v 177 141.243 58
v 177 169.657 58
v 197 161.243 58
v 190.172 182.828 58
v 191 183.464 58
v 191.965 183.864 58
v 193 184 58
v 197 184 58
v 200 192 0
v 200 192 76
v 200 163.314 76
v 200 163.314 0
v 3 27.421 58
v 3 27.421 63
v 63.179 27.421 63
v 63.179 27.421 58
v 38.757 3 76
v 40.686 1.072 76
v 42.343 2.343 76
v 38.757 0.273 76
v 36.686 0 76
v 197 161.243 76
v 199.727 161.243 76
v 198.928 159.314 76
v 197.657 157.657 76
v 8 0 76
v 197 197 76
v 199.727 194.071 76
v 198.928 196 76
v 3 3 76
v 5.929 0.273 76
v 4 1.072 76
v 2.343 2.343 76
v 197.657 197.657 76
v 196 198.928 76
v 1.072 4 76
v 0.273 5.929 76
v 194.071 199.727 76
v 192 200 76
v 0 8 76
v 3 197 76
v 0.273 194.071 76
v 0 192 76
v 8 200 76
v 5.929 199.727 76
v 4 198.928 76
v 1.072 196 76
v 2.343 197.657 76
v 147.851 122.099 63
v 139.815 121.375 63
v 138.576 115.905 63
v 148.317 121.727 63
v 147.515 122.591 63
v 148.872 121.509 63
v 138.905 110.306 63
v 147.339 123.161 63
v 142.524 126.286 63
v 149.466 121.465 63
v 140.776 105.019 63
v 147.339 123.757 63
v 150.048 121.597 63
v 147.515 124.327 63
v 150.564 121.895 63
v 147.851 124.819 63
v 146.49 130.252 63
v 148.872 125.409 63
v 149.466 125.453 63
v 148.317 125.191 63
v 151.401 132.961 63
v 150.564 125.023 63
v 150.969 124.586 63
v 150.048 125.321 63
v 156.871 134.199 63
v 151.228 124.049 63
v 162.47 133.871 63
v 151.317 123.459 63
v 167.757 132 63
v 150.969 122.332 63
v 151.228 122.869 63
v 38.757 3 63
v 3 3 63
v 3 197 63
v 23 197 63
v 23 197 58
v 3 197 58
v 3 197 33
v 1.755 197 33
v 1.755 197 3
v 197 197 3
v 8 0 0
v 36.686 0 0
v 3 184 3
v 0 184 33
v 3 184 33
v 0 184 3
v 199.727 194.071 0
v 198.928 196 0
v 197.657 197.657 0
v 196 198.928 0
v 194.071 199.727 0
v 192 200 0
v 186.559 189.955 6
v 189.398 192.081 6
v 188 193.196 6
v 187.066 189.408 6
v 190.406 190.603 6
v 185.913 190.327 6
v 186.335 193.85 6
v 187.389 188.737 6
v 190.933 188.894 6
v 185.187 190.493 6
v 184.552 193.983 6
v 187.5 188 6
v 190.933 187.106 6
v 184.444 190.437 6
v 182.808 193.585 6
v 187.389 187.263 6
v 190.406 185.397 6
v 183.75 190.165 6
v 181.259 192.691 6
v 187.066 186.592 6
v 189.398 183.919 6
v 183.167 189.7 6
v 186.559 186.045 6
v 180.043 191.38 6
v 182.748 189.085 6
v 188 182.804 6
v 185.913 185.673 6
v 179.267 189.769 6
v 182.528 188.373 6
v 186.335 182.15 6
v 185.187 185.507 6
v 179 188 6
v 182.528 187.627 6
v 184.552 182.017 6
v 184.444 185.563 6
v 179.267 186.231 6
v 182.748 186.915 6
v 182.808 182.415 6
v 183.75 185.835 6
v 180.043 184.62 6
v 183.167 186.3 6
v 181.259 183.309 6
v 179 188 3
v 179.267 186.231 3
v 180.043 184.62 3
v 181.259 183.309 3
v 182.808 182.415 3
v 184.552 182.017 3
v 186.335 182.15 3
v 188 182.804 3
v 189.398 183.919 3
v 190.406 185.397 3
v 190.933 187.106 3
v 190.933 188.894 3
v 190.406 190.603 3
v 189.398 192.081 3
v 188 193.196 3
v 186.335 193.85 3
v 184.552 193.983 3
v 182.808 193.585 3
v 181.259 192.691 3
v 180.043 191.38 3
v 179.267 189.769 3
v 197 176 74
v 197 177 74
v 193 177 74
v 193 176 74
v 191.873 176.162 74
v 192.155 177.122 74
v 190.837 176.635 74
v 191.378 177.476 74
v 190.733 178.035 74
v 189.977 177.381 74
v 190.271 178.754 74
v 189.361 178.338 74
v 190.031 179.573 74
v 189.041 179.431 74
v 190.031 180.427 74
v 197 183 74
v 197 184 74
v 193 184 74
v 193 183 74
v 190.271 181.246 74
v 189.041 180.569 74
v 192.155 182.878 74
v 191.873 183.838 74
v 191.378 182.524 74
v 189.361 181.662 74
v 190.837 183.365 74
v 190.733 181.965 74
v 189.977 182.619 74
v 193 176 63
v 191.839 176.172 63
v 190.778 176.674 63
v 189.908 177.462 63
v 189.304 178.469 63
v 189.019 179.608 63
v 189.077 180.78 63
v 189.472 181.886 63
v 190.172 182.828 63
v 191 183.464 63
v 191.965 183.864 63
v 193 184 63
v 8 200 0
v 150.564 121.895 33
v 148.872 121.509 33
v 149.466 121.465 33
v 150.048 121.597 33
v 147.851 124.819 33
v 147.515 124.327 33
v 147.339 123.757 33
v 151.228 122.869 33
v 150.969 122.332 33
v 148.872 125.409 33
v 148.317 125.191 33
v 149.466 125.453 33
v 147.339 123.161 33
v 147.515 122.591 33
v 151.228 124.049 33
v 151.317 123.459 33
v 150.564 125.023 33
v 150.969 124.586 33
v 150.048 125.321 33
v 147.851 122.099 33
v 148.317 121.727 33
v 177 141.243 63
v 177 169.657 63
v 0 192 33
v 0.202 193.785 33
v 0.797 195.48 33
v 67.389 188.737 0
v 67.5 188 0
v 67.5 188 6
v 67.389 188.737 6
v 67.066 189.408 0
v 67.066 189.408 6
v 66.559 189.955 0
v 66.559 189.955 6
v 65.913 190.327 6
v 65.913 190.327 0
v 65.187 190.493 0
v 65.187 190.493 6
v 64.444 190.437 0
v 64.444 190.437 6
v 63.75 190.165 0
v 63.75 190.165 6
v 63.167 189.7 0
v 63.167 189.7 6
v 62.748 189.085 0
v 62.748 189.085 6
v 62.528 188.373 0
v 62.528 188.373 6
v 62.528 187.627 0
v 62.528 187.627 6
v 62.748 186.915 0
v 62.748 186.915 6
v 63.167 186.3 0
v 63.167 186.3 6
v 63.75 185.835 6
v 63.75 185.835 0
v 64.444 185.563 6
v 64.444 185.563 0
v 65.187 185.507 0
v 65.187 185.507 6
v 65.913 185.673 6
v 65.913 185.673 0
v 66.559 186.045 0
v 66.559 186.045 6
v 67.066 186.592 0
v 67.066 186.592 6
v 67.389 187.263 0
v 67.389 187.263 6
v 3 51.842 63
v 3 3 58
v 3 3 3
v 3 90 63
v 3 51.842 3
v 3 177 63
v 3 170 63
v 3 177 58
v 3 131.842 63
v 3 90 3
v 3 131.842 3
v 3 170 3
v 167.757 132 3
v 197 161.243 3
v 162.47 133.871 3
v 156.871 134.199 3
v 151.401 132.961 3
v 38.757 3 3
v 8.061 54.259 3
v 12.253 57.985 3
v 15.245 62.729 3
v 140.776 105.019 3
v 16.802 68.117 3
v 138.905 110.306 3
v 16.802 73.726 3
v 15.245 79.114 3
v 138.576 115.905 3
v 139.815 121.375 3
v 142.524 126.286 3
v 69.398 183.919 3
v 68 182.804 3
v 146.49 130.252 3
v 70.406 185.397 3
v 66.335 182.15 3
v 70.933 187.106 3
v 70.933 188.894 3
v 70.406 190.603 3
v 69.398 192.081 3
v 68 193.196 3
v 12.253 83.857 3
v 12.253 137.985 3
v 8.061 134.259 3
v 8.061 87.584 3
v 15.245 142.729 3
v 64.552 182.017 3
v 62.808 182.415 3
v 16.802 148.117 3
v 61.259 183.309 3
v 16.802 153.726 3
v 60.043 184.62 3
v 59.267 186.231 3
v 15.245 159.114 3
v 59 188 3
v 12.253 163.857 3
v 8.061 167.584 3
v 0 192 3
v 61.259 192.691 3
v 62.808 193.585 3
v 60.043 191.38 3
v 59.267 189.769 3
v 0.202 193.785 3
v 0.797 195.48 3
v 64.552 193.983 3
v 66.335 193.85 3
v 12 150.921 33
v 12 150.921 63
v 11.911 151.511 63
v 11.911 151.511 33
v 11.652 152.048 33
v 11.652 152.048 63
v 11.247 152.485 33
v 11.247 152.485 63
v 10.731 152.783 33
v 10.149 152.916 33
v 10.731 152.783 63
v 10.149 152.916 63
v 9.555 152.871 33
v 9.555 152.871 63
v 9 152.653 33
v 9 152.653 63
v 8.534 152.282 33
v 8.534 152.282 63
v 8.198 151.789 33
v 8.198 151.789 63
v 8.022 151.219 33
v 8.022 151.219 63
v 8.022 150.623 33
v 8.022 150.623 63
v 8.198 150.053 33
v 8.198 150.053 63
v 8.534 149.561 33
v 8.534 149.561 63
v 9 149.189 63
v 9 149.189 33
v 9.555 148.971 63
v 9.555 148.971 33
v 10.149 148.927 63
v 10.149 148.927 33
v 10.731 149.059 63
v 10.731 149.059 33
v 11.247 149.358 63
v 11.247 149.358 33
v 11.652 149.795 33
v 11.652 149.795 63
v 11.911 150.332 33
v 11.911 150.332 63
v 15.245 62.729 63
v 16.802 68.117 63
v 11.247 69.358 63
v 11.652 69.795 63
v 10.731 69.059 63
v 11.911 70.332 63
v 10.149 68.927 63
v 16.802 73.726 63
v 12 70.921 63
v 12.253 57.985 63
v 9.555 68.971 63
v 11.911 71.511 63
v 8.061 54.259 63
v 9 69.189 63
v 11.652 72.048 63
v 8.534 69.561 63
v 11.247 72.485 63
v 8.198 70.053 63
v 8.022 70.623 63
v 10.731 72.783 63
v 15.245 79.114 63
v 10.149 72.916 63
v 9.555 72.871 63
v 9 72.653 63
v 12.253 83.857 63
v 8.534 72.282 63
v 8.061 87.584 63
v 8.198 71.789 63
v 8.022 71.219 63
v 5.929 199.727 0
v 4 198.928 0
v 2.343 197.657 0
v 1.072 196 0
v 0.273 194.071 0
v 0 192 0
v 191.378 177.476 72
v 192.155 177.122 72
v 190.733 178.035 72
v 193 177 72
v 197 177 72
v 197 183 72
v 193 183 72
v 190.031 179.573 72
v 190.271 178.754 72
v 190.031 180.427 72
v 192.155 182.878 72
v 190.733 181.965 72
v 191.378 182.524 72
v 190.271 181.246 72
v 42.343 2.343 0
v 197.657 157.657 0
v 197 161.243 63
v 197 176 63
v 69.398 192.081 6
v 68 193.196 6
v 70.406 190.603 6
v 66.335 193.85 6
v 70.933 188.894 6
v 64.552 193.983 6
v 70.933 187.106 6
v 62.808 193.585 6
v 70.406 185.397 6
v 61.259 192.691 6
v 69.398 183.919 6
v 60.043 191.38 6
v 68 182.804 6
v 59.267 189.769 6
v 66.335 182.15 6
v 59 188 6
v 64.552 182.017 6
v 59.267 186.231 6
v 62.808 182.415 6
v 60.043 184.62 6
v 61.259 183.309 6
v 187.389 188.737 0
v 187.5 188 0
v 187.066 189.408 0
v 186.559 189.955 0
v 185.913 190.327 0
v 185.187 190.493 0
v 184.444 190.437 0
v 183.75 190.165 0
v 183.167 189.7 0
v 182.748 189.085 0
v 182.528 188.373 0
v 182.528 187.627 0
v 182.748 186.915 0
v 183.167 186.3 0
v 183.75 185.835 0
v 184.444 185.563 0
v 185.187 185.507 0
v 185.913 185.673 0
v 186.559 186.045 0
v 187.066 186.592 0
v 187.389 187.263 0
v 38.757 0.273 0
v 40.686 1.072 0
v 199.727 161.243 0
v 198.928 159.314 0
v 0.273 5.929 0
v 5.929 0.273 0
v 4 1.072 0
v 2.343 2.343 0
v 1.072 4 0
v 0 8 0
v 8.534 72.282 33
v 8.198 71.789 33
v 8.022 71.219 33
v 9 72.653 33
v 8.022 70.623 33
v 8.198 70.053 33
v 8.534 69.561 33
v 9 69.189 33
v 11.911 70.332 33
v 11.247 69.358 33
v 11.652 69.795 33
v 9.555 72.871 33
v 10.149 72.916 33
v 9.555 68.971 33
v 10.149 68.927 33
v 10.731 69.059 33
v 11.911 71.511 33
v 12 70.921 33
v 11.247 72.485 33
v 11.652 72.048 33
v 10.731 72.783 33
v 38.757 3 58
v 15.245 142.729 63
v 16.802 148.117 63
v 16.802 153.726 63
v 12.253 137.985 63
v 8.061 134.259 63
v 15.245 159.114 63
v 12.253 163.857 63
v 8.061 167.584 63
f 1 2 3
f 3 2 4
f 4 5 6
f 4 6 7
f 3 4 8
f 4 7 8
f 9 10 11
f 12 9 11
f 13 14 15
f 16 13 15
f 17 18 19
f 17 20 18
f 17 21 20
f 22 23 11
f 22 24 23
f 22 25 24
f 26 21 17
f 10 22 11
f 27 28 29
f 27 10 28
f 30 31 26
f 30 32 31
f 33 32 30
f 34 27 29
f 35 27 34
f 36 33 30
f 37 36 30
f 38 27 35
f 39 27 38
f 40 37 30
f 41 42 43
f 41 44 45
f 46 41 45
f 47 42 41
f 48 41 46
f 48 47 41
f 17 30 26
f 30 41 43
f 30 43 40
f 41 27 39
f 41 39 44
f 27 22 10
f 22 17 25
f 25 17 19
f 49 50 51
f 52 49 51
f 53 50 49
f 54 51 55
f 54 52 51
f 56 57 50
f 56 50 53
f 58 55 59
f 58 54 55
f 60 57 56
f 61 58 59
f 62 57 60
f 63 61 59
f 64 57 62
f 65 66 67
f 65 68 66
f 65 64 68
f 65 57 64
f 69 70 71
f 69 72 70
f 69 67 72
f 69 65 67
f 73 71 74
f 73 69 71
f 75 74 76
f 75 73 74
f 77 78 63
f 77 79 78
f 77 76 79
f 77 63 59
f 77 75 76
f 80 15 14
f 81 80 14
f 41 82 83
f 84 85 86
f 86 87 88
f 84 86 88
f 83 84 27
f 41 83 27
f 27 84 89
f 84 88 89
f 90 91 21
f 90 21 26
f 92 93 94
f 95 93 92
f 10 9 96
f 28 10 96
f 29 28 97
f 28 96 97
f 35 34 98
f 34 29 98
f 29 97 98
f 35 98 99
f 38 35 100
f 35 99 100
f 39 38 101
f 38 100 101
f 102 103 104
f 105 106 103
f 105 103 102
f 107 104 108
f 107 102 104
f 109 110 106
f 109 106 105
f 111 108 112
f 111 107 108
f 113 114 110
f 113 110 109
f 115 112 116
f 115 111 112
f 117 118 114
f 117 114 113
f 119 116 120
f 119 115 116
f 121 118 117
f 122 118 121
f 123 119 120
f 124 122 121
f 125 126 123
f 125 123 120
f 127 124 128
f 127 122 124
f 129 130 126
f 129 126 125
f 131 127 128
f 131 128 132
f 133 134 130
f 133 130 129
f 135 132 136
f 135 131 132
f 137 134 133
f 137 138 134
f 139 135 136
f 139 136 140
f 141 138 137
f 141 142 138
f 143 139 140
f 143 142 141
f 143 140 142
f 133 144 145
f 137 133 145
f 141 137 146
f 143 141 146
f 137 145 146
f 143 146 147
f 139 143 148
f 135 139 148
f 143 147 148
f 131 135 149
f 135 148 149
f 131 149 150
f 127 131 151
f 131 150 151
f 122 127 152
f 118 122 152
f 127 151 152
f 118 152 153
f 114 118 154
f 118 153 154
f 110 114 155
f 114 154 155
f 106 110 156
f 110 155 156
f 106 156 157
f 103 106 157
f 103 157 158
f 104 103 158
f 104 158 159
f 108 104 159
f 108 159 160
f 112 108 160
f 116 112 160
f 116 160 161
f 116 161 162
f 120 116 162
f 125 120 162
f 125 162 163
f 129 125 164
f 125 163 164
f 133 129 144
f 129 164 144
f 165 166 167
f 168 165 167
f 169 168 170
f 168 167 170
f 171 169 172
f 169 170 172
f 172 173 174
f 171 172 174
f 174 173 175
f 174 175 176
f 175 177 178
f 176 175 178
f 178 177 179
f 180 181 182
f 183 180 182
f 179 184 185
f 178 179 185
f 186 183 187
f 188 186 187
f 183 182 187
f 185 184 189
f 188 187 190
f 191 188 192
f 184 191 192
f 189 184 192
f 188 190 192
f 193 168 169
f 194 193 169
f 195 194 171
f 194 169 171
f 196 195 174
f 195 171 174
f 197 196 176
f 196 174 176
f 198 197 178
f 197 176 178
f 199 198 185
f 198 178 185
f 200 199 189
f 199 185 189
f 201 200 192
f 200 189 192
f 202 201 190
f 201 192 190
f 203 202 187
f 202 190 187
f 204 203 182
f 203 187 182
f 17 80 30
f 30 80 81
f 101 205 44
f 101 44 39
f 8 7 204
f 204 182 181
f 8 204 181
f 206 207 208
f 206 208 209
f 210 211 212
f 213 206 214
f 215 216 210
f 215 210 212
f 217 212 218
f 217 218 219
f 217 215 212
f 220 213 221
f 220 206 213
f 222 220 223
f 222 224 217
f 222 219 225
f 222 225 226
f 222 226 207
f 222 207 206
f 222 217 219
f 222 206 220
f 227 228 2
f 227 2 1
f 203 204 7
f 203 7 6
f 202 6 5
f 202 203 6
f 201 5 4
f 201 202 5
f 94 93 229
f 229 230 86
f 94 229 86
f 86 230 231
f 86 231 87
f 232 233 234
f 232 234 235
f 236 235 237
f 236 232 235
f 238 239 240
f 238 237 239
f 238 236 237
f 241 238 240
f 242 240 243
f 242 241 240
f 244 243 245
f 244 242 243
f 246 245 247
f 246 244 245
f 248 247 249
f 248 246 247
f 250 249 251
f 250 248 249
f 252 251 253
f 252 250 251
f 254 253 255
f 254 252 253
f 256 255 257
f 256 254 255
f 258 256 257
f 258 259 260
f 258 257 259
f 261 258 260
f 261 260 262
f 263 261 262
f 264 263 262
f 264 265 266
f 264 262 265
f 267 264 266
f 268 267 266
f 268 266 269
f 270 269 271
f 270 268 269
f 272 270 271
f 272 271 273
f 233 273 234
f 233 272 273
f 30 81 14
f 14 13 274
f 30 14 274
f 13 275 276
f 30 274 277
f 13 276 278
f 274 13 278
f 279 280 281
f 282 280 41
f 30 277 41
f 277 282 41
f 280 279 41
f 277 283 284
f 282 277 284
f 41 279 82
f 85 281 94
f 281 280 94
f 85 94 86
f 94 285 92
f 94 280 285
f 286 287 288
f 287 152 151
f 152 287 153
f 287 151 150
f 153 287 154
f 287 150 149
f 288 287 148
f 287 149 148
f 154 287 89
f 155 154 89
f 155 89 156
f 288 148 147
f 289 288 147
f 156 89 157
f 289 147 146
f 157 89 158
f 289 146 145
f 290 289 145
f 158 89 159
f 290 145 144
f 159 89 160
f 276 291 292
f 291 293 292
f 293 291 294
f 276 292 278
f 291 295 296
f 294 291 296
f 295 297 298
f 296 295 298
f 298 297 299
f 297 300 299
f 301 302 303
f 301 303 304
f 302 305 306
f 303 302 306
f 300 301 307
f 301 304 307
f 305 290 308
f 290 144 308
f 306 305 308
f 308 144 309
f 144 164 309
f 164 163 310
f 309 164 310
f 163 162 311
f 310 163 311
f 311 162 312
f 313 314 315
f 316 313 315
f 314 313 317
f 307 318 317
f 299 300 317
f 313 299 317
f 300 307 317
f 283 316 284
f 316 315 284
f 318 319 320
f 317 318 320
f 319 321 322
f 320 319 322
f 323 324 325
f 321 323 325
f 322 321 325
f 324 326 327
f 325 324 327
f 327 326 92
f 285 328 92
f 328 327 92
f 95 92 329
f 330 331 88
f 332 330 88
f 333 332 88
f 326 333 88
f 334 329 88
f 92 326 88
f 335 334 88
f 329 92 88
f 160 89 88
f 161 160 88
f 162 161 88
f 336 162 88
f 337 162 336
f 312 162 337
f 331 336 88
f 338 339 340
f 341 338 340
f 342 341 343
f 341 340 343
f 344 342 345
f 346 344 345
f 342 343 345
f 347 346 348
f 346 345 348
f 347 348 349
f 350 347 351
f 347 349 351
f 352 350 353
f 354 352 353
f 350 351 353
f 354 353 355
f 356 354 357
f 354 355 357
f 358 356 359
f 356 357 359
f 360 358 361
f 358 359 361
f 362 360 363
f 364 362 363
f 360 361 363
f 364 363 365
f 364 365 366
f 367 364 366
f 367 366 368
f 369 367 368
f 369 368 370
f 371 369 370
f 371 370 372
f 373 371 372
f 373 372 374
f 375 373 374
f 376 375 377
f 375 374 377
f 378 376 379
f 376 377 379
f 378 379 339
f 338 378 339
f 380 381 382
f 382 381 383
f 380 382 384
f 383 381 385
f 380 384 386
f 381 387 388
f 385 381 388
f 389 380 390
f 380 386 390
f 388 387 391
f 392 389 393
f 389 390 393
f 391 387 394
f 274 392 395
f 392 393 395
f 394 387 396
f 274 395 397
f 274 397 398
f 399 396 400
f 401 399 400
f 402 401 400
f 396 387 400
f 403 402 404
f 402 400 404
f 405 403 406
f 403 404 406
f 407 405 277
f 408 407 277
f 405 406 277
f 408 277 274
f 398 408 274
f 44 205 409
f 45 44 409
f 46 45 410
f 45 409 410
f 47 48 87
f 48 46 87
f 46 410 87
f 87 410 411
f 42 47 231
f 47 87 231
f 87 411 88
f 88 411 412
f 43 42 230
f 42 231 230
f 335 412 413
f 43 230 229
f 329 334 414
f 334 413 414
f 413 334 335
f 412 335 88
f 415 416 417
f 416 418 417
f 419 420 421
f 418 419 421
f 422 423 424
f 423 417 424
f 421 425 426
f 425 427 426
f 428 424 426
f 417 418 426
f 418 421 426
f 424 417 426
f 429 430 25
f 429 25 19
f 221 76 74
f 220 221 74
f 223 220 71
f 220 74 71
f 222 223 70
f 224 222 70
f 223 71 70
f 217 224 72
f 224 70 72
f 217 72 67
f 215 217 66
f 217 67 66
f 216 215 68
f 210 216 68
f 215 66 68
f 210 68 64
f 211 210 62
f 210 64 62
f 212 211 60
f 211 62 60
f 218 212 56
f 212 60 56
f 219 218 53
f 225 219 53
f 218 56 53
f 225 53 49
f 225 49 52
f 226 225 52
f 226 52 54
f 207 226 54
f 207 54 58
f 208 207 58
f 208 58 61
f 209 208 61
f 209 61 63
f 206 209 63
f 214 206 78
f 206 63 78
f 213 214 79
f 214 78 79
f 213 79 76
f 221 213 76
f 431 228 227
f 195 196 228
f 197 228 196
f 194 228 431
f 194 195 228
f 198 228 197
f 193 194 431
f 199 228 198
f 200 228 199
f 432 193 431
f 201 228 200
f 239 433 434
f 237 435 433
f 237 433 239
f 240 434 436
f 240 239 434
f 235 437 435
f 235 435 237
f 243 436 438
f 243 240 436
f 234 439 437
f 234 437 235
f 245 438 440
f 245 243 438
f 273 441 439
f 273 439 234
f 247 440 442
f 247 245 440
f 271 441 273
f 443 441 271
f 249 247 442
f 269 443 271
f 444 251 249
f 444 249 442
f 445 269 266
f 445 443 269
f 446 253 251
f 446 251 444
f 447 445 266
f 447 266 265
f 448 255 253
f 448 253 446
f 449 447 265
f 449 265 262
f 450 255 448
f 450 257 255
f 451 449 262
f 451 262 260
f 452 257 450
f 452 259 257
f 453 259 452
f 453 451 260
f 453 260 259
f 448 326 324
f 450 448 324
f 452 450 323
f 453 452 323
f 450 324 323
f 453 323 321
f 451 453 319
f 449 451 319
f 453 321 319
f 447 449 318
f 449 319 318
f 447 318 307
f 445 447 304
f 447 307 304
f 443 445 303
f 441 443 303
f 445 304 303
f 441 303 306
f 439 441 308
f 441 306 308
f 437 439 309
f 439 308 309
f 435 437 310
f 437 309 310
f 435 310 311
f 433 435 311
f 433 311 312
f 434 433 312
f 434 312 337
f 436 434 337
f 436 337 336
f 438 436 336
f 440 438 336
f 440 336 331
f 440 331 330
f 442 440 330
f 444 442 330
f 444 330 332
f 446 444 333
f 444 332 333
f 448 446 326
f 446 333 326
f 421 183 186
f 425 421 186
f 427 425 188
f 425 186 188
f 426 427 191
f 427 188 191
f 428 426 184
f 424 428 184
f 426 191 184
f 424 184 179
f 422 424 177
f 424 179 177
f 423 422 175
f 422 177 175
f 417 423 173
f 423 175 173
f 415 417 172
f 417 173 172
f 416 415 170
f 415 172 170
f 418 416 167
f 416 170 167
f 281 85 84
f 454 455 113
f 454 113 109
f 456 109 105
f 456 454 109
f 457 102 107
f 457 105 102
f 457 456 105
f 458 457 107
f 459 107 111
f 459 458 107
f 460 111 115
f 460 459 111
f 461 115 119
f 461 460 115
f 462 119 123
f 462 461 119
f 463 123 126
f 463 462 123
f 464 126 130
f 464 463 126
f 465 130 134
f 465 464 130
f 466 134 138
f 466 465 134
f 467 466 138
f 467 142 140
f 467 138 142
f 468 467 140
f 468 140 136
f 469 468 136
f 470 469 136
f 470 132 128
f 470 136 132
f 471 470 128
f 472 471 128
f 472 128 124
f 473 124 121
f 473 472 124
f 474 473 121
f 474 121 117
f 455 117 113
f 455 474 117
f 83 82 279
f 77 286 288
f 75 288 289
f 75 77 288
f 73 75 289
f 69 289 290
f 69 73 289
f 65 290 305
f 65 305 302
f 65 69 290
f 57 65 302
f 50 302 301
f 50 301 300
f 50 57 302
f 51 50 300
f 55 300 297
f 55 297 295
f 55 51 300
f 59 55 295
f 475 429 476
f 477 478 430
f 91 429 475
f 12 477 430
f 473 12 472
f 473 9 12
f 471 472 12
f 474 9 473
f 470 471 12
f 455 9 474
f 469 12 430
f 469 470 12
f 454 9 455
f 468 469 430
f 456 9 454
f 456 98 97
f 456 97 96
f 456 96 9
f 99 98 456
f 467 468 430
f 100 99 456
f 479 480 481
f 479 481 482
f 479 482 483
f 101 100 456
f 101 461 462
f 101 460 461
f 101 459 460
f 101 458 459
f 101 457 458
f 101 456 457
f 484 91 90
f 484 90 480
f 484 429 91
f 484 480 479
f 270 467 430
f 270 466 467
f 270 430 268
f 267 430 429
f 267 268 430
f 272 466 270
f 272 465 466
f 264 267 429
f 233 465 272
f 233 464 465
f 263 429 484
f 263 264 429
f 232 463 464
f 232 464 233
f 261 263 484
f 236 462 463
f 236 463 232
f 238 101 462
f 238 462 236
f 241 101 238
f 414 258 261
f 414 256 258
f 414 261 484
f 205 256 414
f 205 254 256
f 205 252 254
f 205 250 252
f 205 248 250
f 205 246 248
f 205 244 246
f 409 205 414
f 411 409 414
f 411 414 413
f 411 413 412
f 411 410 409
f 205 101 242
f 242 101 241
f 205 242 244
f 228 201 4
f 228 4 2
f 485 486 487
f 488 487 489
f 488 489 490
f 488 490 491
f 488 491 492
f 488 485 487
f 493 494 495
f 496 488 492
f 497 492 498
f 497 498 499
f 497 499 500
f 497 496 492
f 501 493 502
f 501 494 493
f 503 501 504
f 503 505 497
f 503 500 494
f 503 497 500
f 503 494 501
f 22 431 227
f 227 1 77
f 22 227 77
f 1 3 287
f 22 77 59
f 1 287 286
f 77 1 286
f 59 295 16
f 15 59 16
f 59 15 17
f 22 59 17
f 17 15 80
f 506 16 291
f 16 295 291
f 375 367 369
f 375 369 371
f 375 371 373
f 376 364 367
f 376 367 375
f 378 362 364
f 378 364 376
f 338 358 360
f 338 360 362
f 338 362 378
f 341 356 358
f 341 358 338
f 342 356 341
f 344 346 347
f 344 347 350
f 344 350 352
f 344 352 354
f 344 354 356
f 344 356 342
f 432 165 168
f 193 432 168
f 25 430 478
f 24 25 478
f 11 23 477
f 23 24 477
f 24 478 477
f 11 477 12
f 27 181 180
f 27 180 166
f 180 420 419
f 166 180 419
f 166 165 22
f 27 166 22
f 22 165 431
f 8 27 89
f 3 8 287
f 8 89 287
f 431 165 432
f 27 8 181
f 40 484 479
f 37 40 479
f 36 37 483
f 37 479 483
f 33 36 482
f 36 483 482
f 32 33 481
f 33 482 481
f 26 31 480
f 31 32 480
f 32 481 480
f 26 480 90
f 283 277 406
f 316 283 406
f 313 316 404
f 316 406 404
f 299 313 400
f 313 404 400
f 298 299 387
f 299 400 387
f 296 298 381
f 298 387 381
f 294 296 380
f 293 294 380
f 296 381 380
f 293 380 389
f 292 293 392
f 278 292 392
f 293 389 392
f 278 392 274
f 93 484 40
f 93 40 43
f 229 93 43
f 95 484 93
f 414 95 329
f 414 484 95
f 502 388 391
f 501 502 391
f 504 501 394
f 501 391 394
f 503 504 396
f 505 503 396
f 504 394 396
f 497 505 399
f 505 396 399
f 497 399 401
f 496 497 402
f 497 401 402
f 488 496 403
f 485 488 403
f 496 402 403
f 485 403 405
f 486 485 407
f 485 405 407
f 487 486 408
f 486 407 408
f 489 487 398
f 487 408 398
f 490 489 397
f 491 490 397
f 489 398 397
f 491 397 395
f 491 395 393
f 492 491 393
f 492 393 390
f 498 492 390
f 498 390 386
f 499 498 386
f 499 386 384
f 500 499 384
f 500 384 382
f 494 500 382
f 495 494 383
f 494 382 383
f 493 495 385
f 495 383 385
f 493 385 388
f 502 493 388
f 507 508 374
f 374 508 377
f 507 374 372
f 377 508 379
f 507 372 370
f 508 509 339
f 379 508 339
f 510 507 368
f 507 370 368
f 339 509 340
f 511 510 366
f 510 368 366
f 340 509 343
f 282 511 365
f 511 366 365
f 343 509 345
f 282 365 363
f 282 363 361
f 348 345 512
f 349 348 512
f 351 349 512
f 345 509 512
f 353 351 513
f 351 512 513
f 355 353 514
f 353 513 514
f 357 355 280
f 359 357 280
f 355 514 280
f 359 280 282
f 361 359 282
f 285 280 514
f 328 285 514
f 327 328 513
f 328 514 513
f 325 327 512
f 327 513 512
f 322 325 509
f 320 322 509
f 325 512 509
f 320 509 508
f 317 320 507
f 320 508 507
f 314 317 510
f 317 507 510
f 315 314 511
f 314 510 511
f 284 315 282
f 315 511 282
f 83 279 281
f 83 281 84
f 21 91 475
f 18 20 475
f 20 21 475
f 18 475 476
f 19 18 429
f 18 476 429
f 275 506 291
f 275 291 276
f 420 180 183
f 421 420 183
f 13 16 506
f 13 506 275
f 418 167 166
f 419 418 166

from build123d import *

# Parameters (mm, degrees)
ESTRUSIONE_ESTRUSIONE1_DEPTH  = 80
SVUOTA1_T                     = -3
TAGLIO_ESTRUSIONE1_DEPTH      = 294.938769134
TAGLIO_ESTRUSIONE1_DEPTH_BACK = 294.938769134
SCHIZZO5_W                    = 4
SCHIZZO5_H                    = 200
ESTRUSIONE_ESTRUSIONE4_DEPTH  = 60
SCHIZZO8_R                    = 2
TAGLIO_ESTRUSIONE2_DEPTH      = 30
ESTRUSIONE_ESTRUSIONE7_DEPTH  = 5
ESTRUSIONE_ESTRUSIONE8_DEPTH  = 9
ESTRUSIONE_ESTRUSIONE9_START  = 2
ESTRUSIONE_ESTRUSIONE9_DEPTH  = 2
TAGLIO_ESTRUSIONE3_START      = -3
TAGLIO_ESTRUSIONE3_OUTLINE_W  = 30
TAGLIO_ESTRUSIONE3_OUTLINE_H  = 13
TAGLIO_ESTRUSIONE3_DEPTH      = 3
TAGLIO_ESTRUSIONE5_DEPTH      = 10
SCHIZZO18_R                   = 6
ESTRUSIONE_ESTRUSIONE11_DEPTH = 3
TAGLIO_ESTRUSIONE6_DEPTH      = 292.376045687
TAGLIO_ESTRUSIONE6_DEPTH_BACK = 292.376045687
SCHIZZO19_R                   = 2.5
RACCORDO1_R                   = 8


# Read off the part's stored shape, not the designer's step: Taglio-Estrusione3
with BuildPart() as part:
    # Schizzo2 → Estrusione-Estrusione1 (new body)
    with BuildSketch(Plane.XY):
        Polygon((0, 0), (0, 200), (200, 200), (200, 160), (40, 0), align=None)
    extrude(amount=ESTRUSIONE_ESTRUSIONE1_DEPTH)

    # Svuota1
    svuota1_openings = [part.faces().sort_by_distance(p)[0] for p in [
        (78.039215686, 121.960784314, 80),
    ]]
    offset(amount=SVUOTA1_T, openings=svuota1_openings, kind=Kind.INTERSECTION)

    # Schizzo5 → Taglio-Estrusione1 (cut, two sides: drawn at the far end of the back side and taken through both)
    with BuildSketch(Plane(origin=(200, 0, 0), x_dir=(0, 0, -1), z_dir=(1, 0, 0)).offset(-TAGLIO_ESTRUSIONE1_DEPTH_BACK)):
        with Locations((-78, 100)):
            Rectangle(SCHIZZO5_W, SCHIZZO5_H)
    extrude(amount=TAGLIO_ESTRUSIONE1_DEPTH + TAGLIO_ESTRUSIONE1_DEPTH_BACK, mode=Mode.SUBTRACT)

    # Schizzo7 → Estrusione-Estrusione4 (add)
    with BuildSketch(Plane.XY.offset(63)):
        with BuildLine():
            Line((140.775884186, 105.018524874), (167.757359313, 132))
            ThreePointArc((167.757359313, 132), (144.367126813, 128.408757373), (140.775884186, 105.018524874))
        make_face()
        with BuildLine():
            ThreePointArc((3, 170), (17, 150.921215972), (3, 131.842431943))
            Line((3, 131.842431943), (3, 170))
        make_face()
        with BuildLine():
            ThreePointArc((3, 90), (17, 70.921215972), (3, 51.842431943))
            Line((3, 51.842431943), (3, 90))
        make_face()
    extrude(amount=-ESTRUSIONE_ESTRUSIONE4_DEPTH)

    # Schizzo8 → Taglio-Estrusione2 (cut)
    with BuildSketch(Plane.XY.offset(63)):
        with Locations((10, 150.921215972)):
            Circle(SCHIZZO8_R)
        with Locations((10, 70.921215972)):
            Circle(SCHIZZO8_R)
        with Locations((149.316874281, 123.459009905)):
            Circle(SCHIZZO8_R)
    extrude(amount=-TAGLIO_ESTRUSIONE2_DEPTH, mode=Mode.SUBTRACT)

    # Schizzo11 → Estrusione-Estrusione7 (add)
    with BuildSketch(Plane.XY.offset(63)):
        Polygon((3, 197), (3, 177), (23, 197), align=None)
        Polygon((197, 161.242640687), (197, 197), (177, 197), (177, 141.242640687), align=None)
        Polygon((3, 3), (3, 27.421215972), (63.178575285, 27.421215972), (38.757359313, 3), align=None)
    extrude(amount=-ESTRUSIONE_ESTRUSIONE7_DEPTH)

    # Schizzo12 → Estrusione-Estrusione8 (add)
    with BuildSketch(Plane.XY.offset(72)):
        with BuildLine():
            Line((193, 184), (197, 184))
            Line((197, 184), (197, 176))
            Line((197, 176), (193, 176))
            ThreePointArc((193, 176), (189, 180), (193, 184))
        make_face()
    extrude(amount=-ESTRUSIONE_ESTRUSIONE8_DEPTH)

    # Schizzo13 → Estrusione-Estrusione9 (add)
    with BuildSketch(Plane.XY.offset(72).offset(ESTRUSIONE_ESTRUSIONE9_START)):
        with BuildLine():
            Line((193, 177), (196, 177))
            Line((196, 177), (197, 177))
            Line((197, 177), (197, 176))
            Line((197, 176), (193, 176))
            ThreePointArc((193, 176), (189, 180), (193, 184))
            Line((193, 184), (197, 184))
            Line((197, 184), (197, 183))
            Line((197, 183), (193, 183))
            ThreePointArc((193, 183), (190, 180), (193, 177))
        make_face()
    extrude(amount=-ESTRUSIONE_ESTRUSIONE9_DEPTH)

    # Taglio-Estrusione3 outline → Taglio-Estrusione3 (cut)
    with BuildSketch(Plane(origin=(3, 0, 0), x_dir=(0, 0, -1), z_dir=(1, 0, 0)).offset(TAGLIO_ESTRUSIONE3_START)):
        with Locations((-18, 190.5)):
            Rectangle(TAGLIO_ESTRUSIONE3_OUTLINE_W, TAGLIO_ESTRUSIONE3_OUTLINE_H)
    extrude(amount=TAGLIO_ESTRUSIONE3_DEPTH, mode=Mode.SUBTRACT)

    # Schizzo16 → Taglio-Estrusione5 (cut)
    with BuildSketch(Plane.XY.offset(63)):
        with BuildLine():
            Line((190.171572875, 182.828427125), (177, 169.656854249))
            Line((177, 169.656854249), (177, 197))
            Line((177, 197), (197, 197))
            Line((197, 197), (197, 184))
            Line((197, 184), (193, 184))
            ThreePointArc((193, 184), (191.469266271, 183.69551813), (190.171572875, 182.828427125))
        make_face()
    extrude(amount=-TAGLIO_ESTRUSIONE5_DEPTH, mode=Mode.SUBTRACT)

    # Schizzo18 → Estrusione-Estrusione11 (add)
    with BuildSketch(Plane.XY.offset(3)):
        with Locations(Location((65, 188, 0), (0, 0, 180))):
            Circle(SCHIZZO18_R)
        with Locations(Location((185, 188, 0), (0, 0, 180))):
            Circle(SCHIZZO18_R)
    extrude(amount=ESTRUSIONE_ESTRUSIONE11_DEPTH)

    # Schizzo19 → Taglio-Estrusione6 (cut, two sides: drawn at the far end of the back side and taken through both)
    with BuildSketch(Plane.XY.offset(6).offset(-TAGLIO_ESTRUSIONE6_DEPTH_BACK)):
        with Locations((65, 188)):
            Circle(SCHIZZO19_R)
        with Locations((185, 188)):
            Circle(SCHIZZO19_R)
    extrude(amount=TAGLIO_ESTRUSIONE6_DEPTH + TAGLIO_ESTRUSIONE6_DEPTH_BACK, mode=Mode.SUBTRACT)

    # Raccordo1
    # the kernel refuses this fillet: 8 mm, written as the material it takes off along each edge
    with BuildSketch(Plane(origin=(40, 0, -8.284271247), x_dir=(-1, 0, 0), z_dir=(0, 0, 1)), Plane(origin=(200, 160, -8.284271247), x_dir=(-0.7071067811865432, -0.7071067811865518, 0), z_dir=(0, 0, 1))) as raccordo1_piece_1:
        with BuildLine():
            CenterArc((RACCORDO1_R * 0.414213562373, -RACCORDO1_R), RACCORDO1_R, 90, 45)
            Line((-RACCORDO1_R * 0.292893218813, -RACCORDO1_R * 0.292893218813), (0, 0))
            Line((0, 0), (RACCORDO1_R * 0.414213562373, 0))
        make_face()
    extrude(amount=92.568542495, mode=Mode.SUBTRACT)
    with BuildSketch(Plane(origin=(0, 0, -20), x_dir=(0, 1, 0), z_dir=(0, 0, 1))) as raccordo1_piece_2:
        with BuildLine():
            CenterArc((RACCORDO1_R, -RACCORDO1_R), RACCORDO1_R, 90, 90)
            Line((0, -RACCORDO1_R), (0, 0))
            Line((0, 0), (RACCORDO1_R, 0))
        make_face()
    extrude(amount=116, mode=Mode.SUBTRACT)
    with BuildSketch(Plane(origin=(0, 200, -20), x_dir=(0, -1, 0), z_dir=(0, 0, 1)), Plane(origin=(200, 200, -20), x_dir=(-1, 0, 0), z_dir=(0, 0, 1))) as raccordo1_piece_3:
        with BuildLine():
            CenterArc((RACCORDO1_R, RACCORDO1_R), RACCORDO1_R, 180, 90)
            Line((0, RACCORDO1_R), (0, 0))
            Line((0, 0), (RACCORDO1_R, 0))
        make_face()
    extrude(amount=116, mode=Mode.SUBTRACT)


solid = part.part
